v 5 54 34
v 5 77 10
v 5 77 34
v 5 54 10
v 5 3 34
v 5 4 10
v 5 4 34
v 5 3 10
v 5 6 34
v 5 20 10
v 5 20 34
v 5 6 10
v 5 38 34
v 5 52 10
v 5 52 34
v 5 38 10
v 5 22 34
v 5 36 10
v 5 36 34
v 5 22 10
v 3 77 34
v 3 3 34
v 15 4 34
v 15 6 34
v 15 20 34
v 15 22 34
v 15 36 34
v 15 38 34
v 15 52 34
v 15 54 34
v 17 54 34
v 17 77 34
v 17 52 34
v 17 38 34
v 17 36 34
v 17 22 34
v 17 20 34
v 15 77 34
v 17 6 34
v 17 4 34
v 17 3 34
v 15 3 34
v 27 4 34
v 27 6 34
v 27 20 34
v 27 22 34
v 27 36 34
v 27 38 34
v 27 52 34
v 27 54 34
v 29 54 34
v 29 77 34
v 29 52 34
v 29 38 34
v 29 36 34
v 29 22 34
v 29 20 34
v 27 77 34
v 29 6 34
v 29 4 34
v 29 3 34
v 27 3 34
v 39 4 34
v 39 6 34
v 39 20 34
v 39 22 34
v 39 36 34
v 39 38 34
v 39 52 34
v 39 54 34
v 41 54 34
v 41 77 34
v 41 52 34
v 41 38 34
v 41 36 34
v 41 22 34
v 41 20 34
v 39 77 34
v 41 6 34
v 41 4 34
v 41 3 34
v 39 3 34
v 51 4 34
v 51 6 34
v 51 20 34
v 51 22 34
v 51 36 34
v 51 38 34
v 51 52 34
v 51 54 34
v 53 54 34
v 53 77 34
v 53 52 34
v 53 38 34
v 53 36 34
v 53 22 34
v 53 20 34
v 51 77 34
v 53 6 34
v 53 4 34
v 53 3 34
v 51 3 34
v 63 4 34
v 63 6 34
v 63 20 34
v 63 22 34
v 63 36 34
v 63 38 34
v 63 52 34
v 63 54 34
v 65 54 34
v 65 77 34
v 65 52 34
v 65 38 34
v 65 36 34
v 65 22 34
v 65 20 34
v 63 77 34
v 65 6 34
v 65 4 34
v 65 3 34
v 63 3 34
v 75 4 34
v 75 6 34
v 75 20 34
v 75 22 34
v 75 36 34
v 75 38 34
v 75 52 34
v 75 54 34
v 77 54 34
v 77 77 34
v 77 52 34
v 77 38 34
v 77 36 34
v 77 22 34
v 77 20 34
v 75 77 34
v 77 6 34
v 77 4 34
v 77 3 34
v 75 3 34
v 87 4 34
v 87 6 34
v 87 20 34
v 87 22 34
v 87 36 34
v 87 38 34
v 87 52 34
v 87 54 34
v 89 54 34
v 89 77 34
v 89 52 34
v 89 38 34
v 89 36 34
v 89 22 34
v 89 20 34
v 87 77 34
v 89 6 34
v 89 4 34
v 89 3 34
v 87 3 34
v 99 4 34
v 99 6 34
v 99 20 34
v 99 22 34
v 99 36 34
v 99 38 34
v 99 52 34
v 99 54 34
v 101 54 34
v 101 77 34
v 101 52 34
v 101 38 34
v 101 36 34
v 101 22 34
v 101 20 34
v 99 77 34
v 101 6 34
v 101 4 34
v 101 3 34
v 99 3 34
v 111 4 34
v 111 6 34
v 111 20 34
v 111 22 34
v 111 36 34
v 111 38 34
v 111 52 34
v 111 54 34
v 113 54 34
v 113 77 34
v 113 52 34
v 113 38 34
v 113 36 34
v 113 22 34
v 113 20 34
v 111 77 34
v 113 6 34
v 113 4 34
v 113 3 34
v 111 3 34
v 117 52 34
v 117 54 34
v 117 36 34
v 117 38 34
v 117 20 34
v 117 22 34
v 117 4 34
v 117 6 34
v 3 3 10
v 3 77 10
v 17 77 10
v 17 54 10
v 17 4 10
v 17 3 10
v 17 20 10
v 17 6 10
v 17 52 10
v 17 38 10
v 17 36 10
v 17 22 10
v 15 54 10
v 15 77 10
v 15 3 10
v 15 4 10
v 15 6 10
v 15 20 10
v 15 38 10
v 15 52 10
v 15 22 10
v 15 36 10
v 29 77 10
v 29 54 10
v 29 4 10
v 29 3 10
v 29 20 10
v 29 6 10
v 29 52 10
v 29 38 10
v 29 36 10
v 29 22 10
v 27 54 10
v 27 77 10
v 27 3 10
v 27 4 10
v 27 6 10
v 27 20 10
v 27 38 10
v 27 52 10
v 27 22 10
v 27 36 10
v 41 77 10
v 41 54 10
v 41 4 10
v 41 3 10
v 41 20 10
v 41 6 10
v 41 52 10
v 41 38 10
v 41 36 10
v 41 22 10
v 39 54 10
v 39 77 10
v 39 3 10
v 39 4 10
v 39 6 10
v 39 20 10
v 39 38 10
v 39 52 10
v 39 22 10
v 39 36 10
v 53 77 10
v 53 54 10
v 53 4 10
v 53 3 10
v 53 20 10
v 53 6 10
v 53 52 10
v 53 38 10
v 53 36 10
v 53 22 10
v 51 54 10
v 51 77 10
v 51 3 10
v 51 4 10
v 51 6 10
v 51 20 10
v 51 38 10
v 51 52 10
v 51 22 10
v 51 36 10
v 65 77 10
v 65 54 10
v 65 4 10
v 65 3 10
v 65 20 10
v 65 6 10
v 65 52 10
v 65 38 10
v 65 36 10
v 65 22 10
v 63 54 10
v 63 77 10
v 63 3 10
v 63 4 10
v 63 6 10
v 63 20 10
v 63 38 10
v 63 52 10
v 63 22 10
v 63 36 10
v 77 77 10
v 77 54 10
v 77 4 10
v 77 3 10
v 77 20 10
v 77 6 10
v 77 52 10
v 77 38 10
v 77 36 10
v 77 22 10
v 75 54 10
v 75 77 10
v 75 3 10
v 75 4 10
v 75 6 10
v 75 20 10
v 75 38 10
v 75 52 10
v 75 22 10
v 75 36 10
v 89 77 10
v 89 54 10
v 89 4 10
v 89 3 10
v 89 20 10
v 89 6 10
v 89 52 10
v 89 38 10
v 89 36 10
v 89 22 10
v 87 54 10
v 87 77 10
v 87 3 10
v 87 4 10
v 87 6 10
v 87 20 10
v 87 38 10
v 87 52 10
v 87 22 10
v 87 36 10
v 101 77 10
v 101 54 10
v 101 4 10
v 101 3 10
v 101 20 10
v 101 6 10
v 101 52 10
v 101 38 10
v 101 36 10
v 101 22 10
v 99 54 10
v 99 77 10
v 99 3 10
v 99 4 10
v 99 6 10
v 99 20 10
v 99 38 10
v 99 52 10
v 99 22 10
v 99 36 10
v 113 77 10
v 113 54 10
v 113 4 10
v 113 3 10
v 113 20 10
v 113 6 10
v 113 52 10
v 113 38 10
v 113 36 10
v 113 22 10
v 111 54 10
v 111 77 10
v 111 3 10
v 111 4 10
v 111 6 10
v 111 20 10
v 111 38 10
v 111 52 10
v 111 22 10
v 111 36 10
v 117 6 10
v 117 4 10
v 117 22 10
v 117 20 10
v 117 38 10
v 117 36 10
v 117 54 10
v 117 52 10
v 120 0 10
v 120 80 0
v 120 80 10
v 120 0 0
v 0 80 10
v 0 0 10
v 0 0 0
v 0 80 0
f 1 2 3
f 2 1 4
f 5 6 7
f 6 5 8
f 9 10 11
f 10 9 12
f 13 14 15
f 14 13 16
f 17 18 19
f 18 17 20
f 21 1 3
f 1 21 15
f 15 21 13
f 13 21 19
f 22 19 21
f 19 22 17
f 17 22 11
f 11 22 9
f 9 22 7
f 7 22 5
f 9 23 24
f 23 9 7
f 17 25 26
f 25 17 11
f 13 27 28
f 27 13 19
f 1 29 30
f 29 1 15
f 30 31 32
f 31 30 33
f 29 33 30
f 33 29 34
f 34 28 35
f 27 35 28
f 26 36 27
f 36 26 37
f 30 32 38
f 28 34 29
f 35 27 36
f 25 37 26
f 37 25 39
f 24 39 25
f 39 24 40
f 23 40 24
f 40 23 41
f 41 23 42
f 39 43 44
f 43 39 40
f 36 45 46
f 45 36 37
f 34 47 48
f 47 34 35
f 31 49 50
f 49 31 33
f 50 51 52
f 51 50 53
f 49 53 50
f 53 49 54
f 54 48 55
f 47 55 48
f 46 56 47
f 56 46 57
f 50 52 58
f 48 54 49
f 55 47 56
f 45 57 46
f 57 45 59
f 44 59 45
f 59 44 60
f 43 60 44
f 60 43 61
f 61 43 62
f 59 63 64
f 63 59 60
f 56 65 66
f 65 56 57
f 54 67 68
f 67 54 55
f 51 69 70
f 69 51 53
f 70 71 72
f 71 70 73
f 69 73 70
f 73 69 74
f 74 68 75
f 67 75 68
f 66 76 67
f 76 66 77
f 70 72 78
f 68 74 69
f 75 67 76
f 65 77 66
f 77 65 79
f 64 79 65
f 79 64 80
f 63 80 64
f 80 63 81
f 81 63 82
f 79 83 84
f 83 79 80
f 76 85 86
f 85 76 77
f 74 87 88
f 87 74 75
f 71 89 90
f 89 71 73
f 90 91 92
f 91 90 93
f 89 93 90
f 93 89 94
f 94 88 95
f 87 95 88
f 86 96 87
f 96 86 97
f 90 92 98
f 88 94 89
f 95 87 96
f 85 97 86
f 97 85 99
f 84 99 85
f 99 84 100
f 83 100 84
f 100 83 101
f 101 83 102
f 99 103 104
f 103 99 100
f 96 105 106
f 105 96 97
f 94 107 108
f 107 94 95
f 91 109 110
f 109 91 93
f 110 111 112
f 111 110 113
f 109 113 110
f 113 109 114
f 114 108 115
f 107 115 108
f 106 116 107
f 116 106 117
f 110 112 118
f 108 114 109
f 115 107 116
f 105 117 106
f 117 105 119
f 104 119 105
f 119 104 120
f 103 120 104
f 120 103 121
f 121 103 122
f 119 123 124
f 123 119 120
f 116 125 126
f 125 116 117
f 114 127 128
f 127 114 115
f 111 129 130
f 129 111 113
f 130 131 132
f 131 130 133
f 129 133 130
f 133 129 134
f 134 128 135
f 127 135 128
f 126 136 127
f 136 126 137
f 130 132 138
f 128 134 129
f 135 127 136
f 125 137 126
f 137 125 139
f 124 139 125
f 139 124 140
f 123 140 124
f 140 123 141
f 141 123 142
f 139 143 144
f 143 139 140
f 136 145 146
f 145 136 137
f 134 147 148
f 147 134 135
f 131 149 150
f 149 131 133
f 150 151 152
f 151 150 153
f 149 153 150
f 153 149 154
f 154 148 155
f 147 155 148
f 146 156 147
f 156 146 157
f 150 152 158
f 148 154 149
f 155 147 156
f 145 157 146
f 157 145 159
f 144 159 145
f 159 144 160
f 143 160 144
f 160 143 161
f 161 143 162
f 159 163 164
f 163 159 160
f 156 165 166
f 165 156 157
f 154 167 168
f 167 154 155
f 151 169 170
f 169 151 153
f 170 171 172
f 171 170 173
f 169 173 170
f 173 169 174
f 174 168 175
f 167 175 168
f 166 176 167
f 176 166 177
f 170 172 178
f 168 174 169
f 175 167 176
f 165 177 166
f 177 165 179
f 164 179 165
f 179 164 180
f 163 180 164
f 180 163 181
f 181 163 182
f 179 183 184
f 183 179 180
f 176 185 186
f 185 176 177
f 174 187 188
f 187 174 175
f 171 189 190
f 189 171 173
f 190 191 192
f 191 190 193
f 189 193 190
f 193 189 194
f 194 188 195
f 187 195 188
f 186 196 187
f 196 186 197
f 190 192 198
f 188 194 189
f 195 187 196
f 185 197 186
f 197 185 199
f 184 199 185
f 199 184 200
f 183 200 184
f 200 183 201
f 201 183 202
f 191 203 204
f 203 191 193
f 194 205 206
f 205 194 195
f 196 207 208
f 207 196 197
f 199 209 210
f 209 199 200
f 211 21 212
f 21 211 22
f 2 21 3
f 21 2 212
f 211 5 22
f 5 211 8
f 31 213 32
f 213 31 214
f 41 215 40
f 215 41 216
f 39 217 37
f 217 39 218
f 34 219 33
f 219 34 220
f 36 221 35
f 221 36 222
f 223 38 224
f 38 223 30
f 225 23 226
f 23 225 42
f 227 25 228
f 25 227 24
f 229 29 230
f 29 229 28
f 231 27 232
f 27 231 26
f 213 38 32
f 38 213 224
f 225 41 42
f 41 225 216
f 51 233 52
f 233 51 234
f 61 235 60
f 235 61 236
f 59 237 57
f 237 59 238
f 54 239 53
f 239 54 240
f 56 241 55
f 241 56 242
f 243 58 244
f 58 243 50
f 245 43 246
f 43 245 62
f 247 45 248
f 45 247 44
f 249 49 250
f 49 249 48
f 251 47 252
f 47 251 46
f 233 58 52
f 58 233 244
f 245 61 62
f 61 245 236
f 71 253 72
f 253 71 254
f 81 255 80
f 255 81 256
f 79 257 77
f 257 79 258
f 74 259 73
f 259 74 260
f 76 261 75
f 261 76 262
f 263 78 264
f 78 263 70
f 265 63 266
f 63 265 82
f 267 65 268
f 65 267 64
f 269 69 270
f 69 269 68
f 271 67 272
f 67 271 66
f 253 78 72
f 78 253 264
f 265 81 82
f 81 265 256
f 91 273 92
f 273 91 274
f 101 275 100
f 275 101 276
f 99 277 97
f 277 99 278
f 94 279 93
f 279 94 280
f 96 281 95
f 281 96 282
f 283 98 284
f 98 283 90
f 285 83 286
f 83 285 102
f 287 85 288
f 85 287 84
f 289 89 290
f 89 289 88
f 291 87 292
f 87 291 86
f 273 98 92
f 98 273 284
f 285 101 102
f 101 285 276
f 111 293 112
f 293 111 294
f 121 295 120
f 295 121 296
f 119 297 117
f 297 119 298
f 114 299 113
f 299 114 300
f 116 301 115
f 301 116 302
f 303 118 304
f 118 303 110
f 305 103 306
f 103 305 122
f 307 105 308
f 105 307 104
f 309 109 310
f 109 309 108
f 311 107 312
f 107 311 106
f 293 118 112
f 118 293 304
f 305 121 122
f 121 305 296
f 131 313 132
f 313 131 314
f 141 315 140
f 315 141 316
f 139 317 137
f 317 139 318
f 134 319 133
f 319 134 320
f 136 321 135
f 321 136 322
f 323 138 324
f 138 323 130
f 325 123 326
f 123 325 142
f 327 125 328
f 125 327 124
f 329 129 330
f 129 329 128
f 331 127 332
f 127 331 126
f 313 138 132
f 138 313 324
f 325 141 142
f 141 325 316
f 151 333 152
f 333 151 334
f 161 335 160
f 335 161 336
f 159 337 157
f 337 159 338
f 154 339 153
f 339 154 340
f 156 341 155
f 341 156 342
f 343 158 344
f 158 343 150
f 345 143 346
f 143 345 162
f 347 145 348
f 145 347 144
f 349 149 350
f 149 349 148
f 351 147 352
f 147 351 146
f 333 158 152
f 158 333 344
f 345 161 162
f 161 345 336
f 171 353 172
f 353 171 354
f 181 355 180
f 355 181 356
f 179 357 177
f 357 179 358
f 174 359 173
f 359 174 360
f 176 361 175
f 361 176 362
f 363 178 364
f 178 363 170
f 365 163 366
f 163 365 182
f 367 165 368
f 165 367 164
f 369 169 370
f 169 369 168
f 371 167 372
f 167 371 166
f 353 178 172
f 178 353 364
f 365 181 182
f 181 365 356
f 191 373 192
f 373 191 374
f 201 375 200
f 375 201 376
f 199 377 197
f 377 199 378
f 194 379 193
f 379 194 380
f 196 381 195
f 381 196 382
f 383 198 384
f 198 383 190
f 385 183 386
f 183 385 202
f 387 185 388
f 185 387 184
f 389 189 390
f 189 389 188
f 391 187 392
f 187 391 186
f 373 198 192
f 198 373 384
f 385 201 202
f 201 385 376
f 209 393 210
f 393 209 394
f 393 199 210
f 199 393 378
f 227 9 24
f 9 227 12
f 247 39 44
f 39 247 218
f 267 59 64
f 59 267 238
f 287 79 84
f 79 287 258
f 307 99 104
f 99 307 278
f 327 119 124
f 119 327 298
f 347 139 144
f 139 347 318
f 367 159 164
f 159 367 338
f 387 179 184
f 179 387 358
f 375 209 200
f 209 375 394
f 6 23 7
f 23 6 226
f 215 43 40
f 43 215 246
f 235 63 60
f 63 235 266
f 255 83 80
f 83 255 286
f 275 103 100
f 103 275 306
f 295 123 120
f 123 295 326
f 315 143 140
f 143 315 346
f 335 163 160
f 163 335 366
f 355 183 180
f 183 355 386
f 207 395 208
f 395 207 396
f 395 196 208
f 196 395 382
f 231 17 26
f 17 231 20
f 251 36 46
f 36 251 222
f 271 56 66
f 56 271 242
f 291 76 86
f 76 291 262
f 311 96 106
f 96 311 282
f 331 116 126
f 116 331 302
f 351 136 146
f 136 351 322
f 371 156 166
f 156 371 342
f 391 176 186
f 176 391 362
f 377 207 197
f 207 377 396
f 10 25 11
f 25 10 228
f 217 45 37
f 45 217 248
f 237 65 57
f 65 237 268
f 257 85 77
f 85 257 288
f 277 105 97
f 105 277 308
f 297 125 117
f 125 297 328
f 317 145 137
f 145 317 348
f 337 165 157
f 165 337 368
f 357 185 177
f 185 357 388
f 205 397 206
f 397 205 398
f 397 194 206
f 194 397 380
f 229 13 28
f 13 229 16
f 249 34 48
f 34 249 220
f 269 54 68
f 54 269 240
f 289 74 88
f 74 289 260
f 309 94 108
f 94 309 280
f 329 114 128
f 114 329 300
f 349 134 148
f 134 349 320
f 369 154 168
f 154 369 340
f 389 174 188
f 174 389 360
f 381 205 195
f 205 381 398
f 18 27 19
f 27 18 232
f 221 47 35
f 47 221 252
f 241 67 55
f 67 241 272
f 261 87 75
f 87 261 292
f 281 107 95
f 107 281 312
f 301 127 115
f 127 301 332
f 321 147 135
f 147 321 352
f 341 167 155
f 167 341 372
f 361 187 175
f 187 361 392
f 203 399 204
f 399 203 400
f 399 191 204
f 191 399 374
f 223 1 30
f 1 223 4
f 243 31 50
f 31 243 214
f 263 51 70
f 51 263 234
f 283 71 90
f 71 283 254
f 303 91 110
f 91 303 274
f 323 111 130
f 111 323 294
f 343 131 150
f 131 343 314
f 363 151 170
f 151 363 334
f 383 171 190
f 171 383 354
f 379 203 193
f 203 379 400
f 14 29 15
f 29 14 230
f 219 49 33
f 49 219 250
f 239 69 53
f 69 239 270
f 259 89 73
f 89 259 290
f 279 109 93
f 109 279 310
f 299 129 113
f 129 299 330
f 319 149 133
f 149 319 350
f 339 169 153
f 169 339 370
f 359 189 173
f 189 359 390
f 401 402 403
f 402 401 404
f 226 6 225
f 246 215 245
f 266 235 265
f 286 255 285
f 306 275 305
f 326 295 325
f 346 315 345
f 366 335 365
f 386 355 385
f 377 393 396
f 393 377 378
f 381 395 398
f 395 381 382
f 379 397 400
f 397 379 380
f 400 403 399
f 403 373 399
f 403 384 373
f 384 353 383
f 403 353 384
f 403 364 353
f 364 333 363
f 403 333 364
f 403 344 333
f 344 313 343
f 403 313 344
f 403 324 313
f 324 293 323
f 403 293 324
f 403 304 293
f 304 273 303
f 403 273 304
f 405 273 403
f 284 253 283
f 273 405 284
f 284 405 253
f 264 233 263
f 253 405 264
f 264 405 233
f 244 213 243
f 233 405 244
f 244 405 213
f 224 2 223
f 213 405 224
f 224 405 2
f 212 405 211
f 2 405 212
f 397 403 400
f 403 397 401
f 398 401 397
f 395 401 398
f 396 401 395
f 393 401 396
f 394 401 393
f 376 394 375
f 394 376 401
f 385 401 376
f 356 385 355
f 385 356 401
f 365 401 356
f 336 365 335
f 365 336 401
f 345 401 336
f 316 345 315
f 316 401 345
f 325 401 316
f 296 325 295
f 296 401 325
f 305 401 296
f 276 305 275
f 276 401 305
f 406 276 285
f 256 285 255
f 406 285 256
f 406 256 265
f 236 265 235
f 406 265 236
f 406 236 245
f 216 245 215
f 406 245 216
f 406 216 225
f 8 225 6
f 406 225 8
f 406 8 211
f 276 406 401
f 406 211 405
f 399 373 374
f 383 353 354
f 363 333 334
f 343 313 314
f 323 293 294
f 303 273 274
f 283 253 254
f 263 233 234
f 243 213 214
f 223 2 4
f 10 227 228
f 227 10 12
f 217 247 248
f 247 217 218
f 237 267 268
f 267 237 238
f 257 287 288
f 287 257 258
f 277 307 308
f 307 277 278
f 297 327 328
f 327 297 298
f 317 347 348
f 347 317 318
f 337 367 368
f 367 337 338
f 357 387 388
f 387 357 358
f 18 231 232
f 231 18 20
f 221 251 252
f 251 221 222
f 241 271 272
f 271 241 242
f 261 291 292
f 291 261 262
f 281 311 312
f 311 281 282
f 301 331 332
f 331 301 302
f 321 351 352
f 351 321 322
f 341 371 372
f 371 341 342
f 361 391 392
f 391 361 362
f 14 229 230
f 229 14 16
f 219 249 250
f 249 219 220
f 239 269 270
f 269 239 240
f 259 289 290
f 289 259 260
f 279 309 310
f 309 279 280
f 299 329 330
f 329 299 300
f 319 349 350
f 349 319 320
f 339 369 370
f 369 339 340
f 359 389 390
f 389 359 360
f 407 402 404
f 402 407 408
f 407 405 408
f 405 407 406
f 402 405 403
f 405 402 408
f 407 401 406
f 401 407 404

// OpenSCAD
$fn = 32;

// ----------------------------------------------------------------------
// Heatsink: cross fin block
// ----------------------------------------------------------------------

// --- parameters (mm) ---
base_l = 120;             // base length, X
base_w = 80;              // base width, Y
base_t = 10;              // base plate thickness
fin_h = 25;               // fin height above the base
fin_t = 2;                // fin thickness
edge = 3;                 // margin from the base ends
pitch = 12;               // fin pitch
rib_pitch = 16;           // cross rib pitch

n_fins = floor((base_l - 2 * edge - fin_t) / pitch) + 1;  // fin count
total_h = base_t + fin_h - 1;  // overall height
n_ribs = floor((base_w - 2 * edge) / rib_pitch);  // rib count

union() {
  cube([base_l, base_w, base_t]);
  for (i = [0 : n_fins - 1])
    translate([edge + i * pitch, edge, base_t - 1])
      cube([fin_t, base_w - 2 * edge, fin_h]);
  for (i = [0 : n_ribs - 1])
    translate([edge, edge + 1 + i * rib_pitch, base_t - 1])
      cube([base_l - 2 * edge, fin_t, fin_h]);
}
